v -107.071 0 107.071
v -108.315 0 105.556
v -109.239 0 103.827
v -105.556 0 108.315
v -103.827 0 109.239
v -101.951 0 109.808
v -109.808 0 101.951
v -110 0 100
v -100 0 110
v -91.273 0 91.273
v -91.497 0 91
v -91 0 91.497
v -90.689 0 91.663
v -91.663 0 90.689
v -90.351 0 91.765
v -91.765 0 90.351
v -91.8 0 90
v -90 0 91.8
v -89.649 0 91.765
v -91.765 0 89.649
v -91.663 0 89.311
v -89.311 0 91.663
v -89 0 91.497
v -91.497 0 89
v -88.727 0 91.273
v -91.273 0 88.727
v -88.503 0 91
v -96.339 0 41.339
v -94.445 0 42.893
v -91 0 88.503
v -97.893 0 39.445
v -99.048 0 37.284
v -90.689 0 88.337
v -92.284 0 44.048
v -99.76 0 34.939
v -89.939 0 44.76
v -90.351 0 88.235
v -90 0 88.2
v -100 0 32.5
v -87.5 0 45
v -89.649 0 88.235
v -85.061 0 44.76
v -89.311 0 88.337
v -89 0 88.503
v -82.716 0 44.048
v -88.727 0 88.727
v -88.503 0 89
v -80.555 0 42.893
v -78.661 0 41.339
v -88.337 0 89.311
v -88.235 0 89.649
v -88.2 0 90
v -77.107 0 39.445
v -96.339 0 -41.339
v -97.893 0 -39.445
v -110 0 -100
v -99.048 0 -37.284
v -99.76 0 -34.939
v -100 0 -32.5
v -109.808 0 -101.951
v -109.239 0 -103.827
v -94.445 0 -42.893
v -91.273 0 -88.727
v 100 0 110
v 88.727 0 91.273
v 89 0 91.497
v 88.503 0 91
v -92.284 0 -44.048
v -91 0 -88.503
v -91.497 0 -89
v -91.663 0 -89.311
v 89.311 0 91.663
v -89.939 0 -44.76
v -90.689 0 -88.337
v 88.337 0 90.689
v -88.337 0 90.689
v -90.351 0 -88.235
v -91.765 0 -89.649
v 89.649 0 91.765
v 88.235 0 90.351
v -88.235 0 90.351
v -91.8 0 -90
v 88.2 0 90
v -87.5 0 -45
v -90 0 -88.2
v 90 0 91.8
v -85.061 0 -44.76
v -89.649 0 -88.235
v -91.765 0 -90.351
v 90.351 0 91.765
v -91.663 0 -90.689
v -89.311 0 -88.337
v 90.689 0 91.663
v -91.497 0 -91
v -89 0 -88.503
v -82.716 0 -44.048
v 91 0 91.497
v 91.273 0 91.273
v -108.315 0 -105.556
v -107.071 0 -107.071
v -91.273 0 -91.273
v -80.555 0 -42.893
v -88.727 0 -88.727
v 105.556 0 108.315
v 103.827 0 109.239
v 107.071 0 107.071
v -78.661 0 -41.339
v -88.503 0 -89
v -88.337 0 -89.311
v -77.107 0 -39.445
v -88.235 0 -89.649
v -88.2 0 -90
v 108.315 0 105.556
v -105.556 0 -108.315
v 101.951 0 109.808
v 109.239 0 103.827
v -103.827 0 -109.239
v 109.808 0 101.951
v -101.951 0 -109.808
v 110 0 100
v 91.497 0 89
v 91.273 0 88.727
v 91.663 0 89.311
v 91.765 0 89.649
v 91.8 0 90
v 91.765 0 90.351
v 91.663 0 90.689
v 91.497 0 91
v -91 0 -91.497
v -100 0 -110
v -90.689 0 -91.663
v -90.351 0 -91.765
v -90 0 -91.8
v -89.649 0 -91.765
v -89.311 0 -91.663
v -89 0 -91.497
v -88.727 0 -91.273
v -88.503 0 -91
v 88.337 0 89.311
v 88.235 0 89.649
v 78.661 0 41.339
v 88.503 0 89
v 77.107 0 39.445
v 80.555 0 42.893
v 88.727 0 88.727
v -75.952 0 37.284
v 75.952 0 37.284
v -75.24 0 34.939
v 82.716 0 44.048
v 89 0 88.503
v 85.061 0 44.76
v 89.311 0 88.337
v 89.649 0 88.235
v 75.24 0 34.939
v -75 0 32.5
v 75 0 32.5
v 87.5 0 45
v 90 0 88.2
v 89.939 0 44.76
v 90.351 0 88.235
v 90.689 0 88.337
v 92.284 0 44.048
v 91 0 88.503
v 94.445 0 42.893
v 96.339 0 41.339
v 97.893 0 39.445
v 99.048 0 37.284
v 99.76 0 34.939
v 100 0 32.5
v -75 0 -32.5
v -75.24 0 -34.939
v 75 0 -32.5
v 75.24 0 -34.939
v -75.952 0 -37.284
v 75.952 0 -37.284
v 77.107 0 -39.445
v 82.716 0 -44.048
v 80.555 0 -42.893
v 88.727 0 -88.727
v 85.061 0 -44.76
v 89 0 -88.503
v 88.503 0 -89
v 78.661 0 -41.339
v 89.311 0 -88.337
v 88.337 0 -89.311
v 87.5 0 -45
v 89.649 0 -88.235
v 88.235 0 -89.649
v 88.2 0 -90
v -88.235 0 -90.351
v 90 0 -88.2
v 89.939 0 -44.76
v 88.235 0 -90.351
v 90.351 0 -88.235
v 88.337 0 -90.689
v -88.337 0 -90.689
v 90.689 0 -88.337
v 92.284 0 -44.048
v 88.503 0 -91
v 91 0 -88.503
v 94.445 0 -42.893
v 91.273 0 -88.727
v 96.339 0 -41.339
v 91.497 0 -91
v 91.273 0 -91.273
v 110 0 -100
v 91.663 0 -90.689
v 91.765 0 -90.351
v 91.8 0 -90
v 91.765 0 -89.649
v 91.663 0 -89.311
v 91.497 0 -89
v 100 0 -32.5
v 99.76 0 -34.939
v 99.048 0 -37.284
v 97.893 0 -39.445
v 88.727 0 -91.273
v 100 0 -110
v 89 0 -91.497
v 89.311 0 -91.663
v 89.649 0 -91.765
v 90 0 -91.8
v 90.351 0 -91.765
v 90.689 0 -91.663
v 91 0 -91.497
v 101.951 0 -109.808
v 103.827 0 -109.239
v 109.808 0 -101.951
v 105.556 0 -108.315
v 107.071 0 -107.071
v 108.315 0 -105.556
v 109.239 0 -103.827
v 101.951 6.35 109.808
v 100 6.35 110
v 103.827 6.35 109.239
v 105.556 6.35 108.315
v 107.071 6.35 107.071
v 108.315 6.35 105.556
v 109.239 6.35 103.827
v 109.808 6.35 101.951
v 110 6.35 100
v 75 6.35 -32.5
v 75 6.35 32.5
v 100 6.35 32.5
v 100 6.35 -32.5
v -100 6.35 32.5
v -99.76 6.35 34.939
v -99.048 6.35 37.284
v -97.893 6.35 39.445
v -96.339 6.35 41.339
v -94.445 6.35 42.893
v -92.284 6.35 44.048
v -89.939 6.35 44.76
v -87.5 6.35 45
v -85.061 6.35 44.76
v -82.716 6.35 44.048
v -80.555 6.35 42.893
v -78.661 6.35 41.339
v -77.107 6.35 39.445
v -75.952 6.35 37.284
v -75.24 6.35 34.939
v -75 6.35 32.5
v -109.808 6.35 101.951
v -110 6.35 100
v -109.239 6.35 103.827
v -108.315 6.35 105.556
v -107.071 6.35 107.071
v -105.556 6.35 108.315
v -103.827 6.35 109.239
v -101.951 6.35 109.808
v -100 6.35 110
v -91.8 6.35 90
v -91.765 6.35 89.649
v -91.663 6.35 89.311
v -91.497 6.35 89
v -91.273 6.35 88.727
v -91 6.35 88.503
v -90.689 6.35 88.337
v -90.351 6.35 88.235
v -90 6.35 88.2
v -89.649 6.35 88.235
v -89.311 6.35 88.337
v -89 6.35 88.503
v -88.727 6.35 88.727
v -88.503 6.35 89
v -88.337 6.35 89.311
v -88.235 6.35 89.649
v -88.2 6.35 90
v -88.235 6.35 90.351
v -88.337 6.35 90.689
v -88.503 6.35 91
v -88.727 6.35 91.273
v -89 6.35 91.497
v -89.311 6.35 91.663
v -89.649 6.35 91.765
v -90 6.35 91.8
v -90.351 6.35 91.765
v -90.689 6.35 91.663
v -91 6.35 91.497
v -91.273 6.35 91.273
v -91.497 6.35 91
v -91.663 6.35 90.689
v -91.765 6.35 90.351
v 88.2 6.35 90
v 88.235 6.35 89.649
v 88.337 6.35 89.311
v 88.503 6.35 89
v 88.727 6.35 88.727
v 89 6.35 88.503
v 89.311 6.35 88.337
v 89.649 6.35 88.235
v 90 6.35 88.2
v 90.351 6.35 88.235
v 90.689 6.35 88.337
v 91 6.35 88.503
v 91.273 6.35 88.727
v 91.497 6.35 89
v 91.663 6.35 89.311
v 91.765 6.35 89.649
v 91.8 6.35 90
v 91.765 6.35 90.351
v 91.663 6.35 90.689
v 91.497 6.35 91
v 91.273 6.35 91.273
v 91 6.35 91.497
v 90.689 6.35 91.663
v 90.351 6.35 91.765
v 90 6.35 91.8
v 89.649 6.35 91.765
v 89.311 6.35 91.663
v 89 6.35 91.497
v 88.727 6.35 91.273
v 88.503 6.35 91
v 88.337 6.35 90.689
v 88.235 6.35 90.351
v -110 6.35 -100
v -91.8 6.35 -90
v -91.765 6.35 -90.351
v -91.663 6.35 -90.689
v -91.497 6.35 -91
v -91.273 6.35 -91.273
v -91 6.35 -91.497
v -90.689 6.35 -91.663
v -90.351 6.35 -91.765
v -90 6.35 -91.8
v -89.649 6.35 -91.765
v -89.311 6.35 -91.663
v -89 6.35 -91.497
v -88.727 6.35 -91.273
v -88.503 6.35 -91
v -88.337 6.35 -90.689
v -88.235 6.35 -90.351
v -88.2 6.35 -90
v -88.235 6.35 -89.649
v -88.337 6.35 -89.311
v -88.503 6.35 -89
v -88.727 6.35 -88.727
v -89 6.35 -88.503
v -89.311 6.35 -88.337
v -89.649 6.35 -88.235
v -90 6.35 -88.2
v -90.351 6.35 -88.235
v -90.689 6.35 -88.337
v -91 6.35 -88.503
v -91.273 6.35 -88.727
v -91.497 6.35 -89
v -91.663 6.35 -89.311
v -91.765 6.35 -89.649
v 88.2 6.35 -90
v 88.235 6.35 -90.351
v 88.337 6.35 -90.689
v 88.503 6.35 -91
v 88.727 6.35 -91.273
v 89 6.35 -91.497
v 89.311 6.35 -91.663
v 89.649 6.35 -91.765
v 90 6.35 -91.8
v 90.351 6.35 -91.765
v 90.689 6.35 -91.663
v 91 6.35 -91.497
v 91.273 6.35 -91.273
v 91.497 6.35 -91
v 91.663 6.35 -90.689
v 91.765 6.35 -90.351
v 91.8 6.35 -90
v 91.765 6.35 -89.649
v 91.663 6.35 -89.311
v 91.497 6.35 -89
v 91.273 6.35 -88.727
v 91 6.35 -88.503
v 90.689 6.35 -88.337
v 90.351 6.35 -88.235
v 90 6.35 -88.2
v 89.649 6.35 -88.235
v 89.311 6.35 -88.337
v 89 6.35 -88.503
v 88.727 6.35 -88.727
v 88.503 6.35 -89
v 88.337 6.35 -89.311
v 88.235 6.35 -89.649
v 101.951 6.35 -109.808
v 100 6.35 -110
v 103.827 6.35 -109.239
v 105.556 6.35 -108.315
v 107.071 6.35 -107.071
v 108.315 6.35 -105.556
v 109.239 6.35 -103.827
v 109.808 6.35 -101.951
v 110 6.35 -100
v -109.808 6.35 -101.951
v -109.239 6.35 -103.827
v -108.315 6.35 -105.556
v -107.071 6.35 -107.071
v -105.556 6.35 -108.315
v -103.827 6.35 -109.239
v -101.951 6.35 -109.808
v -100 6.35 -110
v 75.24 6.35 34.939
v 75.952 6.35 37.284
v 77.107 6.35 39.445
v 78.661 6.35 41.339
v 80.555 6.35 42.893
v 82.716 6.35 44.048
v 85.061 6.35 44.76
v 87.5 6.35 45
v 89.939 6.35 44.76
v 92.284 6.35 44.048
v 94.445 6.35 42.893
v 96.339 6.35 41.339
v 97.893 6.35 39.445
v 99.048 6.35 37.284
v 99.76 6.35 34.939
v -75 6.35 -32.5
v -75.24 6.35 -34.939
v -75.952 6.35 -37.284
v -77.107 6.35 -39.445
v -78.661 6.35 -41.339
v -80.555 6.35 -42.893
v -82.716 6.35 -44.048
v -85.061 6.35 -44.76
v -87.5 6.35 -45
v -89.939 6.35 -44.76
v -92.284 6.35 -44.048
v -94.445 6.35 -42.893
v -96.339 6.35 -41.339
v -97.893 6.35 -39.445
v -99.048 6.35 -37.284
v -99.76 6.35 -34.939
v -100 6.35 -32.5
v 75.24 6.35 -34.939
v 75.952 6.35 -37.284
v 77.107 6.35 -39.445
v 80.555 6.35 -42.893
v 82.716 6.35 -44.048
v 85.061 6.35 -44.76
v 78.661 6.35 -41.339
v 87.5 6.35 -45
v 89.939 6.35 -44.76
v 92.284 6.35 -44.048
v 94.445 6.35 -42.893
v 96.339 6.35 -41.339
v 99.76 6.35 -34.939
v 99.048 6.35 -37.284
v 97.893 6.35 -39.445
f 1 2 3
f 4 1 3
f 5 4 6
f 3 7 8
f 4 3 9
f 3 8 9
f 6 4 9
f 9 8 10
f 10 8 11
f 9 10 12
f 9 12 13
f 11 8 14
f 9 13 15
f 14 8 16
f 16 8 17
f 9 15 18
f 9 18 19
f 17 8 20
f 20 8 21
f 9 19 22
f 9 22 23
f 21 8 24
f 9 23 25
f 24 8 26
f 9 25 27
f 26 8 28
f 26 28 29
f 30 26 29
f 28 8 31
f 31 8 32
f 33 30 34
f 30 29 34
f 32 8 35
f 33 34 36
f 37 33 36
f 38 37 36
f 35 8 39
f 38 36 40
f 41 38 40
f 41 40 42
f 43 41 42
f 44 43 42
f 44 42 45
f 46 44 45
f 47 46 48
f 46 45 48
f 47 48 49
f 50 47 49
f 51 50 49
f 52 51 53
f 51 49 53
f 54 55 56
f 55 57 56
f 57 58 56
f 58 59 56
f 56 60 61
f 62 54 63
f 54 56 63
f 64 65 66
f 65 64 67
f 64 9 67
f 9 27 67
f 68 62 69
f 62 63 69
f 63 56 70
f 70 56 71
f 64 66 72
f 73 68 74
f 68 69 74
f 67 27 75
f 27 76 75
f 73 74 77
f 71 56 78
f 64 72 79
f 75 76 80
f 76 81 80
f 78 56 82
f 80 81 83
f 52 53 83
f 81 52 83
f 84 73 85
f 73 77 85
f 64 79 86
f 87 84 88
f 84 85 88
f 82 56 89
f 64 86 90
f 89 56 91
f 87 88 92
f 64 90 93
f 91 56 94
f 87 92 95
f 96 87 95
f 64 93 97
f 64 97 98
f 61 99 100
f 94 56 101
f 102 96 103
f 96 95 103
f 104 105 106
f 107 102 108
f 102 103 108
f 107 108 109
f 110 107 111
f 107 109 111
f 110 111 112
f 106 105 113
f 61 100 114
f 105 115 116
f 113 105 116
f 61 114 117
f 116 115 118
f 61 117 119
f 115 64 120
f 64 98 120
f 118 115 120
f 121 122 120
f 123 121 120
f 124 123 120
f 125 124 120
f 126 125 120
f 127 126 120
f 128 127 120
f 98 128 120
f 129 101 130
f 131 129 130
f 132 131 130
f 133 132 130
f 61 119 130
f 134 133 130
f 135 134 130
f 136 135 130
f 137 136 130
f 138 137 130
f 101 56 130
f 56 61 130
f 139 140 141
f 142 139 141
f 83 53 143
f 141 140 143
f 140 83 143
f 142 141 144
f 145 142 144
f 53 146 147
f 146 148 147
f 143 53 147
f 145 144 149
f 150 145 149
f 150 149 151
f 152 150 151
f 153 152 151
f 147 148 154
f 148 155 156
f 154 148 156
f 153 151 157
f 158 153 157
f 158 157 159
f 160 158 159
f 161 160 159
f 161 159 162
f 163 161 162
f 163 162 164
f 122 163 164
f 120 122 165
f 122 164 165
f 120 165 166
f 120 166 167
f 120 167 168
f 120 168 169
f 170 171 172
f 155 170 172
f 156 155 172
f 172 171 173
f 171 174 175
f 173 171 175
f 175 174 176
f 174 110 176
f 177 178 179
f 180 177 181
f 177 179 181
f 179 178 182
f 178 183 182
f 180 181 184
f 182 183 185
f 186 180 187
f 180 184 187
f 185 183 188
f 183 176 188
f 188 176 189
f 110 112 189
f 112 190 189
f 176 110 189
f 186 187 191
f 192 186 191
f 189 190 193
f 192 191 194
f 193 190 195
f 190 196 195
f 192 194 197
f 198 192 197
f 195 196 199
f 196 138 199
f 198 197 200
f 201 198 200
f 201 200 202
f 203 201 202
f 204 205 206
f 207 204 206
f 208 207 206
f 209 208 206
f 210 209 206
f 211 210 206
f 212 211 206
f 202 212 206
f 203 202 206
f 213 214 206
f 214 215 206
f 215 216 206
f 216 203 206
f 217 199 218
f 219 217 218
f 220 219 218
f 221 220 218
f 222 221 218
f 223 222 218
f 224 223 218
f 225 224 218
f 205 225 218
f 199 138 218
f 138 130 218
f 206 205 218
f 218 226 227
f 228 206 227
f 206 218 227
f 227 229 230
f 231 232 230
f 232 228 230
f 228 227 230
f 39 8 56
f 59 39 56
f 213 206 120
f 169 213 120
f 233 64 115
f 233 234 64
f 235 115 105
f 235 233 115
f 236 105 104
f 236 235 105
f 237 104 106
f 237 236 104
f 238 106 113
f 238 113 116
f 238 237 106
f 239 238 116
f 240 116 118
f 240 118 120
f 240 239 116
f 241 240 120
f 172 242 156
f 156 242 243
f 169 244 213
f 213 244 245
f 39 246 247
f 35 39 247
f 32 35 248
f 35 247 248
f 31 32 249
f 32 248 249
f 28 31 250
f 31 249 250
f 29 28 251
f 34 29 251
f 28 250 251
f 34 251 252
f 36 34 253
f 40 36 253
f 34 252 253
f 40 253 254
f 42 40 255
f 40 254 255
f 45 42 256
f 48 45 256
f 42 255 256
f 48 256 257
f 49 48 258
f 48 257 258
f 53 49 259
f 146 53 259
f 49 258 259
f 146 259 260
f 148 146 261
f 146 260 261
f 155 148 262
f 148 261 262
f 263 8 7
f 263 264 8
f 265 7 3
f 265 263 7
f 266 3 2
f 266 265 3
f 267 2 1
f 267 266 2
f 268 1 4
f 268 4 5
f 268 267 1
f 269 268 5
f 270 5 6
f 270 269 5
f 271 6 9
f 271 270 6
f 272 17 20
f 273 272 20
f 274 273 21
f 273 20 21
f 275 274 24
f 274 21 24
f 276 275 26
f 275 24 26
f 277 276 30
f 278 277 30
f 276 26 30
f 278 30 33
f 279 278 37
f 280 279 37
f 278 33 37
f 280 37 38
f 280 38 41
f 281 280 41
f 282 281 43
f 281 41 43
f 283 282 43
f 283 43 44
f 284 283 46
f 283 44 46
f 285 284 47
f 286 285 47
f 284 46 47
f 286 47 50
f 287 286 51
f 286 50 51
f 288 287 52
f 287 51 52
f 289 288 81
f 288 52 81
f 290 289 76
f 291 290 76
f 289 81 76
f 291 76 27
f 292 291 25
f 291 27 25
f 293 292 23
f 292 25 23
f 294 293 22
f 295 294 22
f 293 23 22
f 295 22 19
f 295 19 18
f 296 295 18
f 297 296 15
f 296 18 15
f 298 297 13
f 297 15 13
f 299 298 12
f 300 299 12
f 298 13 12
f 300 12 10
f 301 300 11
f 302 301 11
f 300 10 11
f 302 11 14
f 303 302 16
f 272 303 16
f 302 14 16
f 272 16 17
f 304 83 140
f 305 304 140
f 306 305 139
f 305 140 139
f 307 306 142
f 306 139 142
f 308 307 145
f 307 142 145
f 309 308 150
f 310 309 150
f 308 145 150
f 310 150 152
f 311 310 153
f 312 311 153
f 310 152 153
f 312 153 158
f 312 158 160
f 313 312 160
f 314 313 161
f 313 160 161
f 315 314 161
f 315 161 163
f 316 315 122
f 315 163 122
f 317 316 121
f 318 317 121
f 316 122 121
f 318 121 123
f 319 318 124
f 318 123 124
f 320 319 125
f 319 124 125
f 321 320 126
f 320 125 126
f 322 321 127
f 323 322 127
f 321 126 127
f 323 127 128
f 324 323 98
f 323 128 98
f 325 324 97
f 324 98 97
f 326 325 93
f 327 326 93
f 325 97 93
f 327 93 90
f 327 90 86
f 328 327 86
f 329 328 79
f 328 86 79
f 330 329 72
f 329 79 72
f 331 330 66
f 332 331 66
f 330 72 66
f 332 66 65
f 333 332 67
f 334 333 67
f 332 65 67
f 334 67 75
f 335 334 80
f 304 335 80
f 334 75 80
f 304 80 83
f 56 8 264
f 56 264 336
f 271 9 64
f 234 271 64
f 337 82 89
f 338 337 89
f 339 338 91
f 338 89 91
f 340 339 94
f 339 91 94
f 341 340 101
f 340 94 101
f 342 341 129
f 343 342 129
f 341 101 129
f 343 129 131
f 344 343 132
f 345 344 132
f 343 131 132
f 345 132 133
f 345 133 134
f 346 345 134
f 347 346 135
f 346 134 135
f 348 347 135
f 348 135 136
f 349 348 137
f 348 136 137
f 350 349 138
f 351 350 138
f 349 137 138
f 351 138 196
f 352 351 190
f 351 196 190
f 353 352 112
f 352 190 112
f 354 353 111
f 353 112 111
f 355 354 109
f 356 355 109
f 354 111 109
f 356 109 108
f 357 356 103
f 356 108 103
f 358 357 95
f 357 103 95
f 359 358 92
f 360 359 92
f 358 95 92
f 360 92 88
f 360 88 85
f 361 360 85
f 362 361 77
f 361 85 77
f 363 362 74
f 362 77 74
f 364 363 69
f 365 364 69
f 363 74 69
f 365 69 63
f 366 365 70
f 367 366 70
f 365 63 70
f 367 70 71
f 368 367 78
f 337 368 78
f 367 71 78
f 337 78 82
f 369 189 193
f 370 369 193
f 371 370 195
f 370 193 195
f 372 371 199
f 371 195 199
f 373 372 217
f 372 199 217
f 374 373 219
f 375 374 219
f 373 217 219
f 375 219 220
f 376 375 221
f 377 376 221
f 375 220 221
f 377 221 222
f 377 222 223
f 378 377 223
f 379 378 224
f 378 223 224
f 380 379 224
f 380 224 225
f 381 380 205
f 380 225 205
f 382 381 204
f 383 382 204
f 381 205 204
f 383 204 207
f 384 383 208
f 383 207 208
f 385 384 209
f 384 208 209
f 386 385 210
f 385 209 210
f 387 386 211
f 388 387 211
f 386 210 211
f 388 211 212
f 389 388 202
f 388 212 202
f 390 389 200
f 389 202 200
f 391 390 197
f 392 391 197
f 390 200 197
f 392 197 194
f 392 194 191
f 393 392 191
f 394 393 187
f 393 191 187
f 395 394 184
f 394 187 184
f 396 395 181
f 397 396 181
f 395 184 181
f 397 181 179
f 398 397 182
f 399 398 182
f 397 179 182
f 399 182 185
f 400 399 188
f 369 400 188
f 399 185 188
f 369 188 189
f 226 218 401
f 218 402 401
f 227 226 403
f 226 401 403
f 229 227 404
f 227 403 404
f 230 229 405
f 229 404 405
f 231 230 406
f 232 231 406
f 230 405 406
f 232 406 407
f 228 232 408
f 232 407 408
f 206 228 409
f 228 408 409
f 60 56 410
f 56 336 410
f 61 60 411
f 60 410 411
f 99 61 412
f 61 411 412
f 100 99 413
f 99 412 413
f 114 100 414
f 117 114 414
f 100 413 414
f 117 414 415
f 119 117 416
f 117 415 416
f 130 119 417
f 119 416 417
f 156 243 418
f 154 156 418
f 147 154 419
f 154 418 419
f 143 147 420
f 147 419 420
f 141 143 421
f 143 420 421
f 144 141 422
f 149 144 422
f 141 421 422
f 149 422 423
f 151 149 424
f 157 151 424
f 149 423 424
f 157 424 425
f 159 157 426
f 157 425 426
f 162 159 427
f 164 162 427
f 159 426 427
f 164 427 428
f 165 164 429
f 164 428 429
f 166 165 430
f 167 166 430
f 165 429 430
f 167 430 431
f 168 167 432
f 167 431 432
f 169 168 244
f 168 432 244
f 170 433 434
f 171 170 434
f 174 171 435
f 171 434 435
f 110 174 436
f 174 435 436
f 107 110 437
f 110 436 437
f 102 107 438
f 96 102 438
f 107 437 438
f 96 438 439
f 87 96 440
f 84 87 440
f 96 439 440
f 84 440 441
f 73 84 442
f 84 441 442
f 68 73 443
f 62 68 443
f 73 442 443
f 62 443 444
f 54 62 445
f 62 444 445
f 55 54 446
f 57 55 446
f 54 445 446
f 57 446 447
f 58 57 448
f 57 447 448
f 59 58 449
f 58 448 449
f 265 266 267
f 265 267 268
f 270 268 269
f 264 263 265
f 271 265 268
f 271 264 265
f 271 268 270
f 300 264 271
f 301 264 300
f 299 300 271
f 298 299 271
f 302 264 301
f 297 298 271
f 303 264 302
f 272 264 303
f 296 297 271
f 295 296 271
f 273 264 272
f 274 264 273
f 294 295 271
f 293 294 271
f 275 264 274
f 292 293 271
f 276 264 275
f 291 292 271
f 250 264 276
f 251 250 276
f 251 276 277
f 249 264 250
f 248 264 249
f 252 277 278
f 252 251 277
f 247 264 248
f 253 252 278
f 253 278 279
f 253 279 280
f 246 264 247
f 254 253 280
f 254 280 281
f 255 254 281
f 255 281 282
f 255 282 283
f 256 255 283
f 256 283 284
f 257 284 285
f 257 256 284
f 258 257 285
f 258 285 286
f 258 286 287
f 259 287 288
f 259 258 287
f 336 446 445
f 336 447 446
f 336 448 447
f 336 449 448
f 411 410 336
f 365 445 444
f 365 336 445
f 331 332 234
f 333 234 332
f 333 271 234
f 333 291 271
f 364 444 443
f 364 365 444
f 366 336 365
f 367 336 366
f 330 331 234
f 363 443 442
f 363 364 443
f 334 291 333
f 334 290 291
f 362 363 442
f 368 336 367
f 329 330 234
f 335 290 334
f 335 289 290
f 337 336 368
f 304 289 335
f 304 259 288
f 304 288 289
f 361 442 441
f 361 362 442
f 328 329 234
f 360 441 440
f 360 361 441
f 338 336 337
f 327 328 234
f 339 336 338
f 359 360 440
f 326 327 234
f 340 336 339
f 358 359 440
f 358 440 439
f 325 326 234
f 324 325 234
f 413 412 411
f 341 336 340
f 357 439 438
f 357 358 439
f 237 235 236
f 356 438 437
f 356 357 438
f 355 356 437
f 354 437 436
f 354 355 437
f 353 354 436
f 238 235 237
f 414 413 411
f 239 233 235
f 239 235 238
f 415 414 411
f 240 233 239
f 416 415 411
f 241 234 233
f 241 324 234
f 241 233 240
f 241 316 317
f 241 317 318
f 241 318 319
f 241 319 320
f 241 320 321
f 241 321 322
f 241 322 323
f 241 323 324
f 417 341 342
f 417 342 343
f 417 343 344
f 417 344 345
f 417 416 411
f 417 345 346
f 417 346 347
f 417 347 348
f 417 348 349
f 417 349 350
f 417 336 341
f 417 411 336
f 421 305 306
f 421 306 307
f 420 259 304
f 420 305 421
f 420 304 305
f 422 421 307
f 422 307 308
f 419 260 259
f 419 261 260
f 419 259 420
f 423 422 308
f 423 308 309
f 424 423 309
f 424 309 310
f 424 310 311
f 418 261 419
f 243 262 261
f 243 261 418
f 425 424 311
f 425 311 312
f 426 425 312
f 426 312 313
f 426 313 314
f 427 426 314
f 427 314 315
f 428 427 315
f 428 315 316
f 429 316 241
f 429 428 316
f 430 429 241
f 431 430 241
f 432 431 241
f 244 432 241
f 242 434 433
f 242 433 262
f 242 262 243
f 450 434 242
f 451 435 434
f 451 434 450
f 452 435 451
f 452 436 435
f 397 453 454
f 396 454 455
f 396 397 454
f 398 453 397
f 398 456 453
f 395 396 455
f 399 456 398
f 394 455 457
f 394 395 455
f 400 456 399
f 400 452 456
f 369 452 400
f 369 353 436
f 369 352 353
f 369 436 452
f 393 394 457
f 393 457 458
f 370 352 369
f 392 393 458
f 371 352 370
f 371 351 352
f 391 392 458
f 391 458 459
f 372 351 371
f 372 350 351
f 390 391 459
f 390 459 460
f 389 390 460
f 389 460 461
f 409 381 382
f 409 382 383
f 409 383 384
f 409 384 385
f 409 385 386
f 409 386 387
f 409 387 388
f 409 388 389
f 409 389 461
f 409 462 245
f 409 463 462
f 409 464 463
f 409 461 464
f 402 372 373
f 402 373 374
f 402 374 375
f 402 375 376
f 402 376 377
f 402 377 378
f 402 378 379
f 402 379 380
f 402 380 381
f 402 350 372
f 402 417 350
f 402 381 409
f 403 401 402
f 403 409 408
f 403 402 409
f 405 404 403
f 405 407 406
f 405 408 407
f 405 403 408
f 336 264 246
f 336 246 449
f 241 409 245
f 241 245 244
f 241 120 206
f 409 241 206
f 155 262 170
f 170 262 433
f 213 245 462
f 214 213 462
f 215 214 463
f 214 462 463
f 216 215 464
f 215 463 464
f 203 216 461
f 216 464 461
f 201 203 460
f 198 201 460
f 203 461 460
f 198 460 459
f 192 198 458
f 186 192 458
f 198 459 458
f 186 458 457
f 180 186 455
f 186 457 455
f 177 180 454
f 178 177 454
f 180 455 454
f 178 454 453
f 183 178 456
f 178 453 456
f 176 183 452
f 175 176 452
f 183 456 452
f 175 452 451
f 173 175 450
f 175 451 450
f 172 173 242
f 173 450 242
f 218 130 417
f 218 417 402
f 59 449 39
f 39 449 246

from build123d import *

# Parameters (mm, degrees)
SKETCH2_W           = 220
SKETCH2_H           = 220
BOSS_EXTRUDE1_DEPTH = 6.35
SKETCH3_R           = 1.8
CUT_EXTRUDE1_DEPTH  = 6.35
FILLET1_R           = 10
CUT_EXTRUDE2_DEPTH  = 10


with BuildPart() as part:
    # Sketch2 → Boss-Extrude1 (new body)
    with BuildSketch(Plane(origin=(0, 0, 0), x_dir=(1, 0, 0), z_dir=(0, 1, 0))):
        Rectangle(SKETCH2_W, SKETCH2_H)
    extrude(amount=BOSS_EXTRUDE1_DEPTH)

    # Sketch3 → Cut-Extrude1 (cut)
    with BuildSketch(Plane(origin=(0, 0, 0), x_dir=(-1, 0, 0), z_dir=(0, -1, 0))):
        with Locations((90, -90)):
            Circle(SKETCH3_R)
        with Locations((90, 90)):
            Circle(SKETCH3_R)
        with Locations((-90, 90)):
            Circle(SKETCH3_R)
        with Locations((-90, -90)):
            Circle(SKETCH3_R)
    extrude(amount=-CUT_EXTRUDE1_DEPTH, mode=Mode.SUBTRACT)

    # Fillet1
    fillet1_edges = [part.edges().sort_by_distance(p)[0] for p in [
        (110, 3.175, 110),
        (-110, 3.175, 110),
        (-110, 3.175, -110),
        (110, 3.175, -110),
    ]]
    fillet(fillet1_edges, radius=FILLET1_R)

    # Sketch7 → Cut-Extrude2 (cut)
    with BuildSketch(Plane(origin=(0, 6.35, 0), x_dir=(1, 0, 0), z_dir=(0, 1, 0))):
        with BuildLine():
            Line((-100, 32.5), (-100, -32.5))
            ThreePointArc((-100, -32.5), (-87.5, -45), (-75, -32.5))
            Line((-75, -32.5), (-75, 32.5))
            ThreePointArc((-75, 32.5), (-87.5, 45), (-100, 32.5))
        make_face()
        with BuildLine():
            Line((75, 32.5), (75, -32.5))
            ThreePointArc((75, -32.5), (87.5, -45), (100, -32.5))
            Line((100, -32.5), (100, 32.5))
            ThreePointArc((100, 32.5), (87.5, 45), (75, 32.5))
        make_face()
    extrude(amount=-CUT_EXTRUDE2_DEPTH, mode=Mode.SUBTRACT)


solid = part.part
